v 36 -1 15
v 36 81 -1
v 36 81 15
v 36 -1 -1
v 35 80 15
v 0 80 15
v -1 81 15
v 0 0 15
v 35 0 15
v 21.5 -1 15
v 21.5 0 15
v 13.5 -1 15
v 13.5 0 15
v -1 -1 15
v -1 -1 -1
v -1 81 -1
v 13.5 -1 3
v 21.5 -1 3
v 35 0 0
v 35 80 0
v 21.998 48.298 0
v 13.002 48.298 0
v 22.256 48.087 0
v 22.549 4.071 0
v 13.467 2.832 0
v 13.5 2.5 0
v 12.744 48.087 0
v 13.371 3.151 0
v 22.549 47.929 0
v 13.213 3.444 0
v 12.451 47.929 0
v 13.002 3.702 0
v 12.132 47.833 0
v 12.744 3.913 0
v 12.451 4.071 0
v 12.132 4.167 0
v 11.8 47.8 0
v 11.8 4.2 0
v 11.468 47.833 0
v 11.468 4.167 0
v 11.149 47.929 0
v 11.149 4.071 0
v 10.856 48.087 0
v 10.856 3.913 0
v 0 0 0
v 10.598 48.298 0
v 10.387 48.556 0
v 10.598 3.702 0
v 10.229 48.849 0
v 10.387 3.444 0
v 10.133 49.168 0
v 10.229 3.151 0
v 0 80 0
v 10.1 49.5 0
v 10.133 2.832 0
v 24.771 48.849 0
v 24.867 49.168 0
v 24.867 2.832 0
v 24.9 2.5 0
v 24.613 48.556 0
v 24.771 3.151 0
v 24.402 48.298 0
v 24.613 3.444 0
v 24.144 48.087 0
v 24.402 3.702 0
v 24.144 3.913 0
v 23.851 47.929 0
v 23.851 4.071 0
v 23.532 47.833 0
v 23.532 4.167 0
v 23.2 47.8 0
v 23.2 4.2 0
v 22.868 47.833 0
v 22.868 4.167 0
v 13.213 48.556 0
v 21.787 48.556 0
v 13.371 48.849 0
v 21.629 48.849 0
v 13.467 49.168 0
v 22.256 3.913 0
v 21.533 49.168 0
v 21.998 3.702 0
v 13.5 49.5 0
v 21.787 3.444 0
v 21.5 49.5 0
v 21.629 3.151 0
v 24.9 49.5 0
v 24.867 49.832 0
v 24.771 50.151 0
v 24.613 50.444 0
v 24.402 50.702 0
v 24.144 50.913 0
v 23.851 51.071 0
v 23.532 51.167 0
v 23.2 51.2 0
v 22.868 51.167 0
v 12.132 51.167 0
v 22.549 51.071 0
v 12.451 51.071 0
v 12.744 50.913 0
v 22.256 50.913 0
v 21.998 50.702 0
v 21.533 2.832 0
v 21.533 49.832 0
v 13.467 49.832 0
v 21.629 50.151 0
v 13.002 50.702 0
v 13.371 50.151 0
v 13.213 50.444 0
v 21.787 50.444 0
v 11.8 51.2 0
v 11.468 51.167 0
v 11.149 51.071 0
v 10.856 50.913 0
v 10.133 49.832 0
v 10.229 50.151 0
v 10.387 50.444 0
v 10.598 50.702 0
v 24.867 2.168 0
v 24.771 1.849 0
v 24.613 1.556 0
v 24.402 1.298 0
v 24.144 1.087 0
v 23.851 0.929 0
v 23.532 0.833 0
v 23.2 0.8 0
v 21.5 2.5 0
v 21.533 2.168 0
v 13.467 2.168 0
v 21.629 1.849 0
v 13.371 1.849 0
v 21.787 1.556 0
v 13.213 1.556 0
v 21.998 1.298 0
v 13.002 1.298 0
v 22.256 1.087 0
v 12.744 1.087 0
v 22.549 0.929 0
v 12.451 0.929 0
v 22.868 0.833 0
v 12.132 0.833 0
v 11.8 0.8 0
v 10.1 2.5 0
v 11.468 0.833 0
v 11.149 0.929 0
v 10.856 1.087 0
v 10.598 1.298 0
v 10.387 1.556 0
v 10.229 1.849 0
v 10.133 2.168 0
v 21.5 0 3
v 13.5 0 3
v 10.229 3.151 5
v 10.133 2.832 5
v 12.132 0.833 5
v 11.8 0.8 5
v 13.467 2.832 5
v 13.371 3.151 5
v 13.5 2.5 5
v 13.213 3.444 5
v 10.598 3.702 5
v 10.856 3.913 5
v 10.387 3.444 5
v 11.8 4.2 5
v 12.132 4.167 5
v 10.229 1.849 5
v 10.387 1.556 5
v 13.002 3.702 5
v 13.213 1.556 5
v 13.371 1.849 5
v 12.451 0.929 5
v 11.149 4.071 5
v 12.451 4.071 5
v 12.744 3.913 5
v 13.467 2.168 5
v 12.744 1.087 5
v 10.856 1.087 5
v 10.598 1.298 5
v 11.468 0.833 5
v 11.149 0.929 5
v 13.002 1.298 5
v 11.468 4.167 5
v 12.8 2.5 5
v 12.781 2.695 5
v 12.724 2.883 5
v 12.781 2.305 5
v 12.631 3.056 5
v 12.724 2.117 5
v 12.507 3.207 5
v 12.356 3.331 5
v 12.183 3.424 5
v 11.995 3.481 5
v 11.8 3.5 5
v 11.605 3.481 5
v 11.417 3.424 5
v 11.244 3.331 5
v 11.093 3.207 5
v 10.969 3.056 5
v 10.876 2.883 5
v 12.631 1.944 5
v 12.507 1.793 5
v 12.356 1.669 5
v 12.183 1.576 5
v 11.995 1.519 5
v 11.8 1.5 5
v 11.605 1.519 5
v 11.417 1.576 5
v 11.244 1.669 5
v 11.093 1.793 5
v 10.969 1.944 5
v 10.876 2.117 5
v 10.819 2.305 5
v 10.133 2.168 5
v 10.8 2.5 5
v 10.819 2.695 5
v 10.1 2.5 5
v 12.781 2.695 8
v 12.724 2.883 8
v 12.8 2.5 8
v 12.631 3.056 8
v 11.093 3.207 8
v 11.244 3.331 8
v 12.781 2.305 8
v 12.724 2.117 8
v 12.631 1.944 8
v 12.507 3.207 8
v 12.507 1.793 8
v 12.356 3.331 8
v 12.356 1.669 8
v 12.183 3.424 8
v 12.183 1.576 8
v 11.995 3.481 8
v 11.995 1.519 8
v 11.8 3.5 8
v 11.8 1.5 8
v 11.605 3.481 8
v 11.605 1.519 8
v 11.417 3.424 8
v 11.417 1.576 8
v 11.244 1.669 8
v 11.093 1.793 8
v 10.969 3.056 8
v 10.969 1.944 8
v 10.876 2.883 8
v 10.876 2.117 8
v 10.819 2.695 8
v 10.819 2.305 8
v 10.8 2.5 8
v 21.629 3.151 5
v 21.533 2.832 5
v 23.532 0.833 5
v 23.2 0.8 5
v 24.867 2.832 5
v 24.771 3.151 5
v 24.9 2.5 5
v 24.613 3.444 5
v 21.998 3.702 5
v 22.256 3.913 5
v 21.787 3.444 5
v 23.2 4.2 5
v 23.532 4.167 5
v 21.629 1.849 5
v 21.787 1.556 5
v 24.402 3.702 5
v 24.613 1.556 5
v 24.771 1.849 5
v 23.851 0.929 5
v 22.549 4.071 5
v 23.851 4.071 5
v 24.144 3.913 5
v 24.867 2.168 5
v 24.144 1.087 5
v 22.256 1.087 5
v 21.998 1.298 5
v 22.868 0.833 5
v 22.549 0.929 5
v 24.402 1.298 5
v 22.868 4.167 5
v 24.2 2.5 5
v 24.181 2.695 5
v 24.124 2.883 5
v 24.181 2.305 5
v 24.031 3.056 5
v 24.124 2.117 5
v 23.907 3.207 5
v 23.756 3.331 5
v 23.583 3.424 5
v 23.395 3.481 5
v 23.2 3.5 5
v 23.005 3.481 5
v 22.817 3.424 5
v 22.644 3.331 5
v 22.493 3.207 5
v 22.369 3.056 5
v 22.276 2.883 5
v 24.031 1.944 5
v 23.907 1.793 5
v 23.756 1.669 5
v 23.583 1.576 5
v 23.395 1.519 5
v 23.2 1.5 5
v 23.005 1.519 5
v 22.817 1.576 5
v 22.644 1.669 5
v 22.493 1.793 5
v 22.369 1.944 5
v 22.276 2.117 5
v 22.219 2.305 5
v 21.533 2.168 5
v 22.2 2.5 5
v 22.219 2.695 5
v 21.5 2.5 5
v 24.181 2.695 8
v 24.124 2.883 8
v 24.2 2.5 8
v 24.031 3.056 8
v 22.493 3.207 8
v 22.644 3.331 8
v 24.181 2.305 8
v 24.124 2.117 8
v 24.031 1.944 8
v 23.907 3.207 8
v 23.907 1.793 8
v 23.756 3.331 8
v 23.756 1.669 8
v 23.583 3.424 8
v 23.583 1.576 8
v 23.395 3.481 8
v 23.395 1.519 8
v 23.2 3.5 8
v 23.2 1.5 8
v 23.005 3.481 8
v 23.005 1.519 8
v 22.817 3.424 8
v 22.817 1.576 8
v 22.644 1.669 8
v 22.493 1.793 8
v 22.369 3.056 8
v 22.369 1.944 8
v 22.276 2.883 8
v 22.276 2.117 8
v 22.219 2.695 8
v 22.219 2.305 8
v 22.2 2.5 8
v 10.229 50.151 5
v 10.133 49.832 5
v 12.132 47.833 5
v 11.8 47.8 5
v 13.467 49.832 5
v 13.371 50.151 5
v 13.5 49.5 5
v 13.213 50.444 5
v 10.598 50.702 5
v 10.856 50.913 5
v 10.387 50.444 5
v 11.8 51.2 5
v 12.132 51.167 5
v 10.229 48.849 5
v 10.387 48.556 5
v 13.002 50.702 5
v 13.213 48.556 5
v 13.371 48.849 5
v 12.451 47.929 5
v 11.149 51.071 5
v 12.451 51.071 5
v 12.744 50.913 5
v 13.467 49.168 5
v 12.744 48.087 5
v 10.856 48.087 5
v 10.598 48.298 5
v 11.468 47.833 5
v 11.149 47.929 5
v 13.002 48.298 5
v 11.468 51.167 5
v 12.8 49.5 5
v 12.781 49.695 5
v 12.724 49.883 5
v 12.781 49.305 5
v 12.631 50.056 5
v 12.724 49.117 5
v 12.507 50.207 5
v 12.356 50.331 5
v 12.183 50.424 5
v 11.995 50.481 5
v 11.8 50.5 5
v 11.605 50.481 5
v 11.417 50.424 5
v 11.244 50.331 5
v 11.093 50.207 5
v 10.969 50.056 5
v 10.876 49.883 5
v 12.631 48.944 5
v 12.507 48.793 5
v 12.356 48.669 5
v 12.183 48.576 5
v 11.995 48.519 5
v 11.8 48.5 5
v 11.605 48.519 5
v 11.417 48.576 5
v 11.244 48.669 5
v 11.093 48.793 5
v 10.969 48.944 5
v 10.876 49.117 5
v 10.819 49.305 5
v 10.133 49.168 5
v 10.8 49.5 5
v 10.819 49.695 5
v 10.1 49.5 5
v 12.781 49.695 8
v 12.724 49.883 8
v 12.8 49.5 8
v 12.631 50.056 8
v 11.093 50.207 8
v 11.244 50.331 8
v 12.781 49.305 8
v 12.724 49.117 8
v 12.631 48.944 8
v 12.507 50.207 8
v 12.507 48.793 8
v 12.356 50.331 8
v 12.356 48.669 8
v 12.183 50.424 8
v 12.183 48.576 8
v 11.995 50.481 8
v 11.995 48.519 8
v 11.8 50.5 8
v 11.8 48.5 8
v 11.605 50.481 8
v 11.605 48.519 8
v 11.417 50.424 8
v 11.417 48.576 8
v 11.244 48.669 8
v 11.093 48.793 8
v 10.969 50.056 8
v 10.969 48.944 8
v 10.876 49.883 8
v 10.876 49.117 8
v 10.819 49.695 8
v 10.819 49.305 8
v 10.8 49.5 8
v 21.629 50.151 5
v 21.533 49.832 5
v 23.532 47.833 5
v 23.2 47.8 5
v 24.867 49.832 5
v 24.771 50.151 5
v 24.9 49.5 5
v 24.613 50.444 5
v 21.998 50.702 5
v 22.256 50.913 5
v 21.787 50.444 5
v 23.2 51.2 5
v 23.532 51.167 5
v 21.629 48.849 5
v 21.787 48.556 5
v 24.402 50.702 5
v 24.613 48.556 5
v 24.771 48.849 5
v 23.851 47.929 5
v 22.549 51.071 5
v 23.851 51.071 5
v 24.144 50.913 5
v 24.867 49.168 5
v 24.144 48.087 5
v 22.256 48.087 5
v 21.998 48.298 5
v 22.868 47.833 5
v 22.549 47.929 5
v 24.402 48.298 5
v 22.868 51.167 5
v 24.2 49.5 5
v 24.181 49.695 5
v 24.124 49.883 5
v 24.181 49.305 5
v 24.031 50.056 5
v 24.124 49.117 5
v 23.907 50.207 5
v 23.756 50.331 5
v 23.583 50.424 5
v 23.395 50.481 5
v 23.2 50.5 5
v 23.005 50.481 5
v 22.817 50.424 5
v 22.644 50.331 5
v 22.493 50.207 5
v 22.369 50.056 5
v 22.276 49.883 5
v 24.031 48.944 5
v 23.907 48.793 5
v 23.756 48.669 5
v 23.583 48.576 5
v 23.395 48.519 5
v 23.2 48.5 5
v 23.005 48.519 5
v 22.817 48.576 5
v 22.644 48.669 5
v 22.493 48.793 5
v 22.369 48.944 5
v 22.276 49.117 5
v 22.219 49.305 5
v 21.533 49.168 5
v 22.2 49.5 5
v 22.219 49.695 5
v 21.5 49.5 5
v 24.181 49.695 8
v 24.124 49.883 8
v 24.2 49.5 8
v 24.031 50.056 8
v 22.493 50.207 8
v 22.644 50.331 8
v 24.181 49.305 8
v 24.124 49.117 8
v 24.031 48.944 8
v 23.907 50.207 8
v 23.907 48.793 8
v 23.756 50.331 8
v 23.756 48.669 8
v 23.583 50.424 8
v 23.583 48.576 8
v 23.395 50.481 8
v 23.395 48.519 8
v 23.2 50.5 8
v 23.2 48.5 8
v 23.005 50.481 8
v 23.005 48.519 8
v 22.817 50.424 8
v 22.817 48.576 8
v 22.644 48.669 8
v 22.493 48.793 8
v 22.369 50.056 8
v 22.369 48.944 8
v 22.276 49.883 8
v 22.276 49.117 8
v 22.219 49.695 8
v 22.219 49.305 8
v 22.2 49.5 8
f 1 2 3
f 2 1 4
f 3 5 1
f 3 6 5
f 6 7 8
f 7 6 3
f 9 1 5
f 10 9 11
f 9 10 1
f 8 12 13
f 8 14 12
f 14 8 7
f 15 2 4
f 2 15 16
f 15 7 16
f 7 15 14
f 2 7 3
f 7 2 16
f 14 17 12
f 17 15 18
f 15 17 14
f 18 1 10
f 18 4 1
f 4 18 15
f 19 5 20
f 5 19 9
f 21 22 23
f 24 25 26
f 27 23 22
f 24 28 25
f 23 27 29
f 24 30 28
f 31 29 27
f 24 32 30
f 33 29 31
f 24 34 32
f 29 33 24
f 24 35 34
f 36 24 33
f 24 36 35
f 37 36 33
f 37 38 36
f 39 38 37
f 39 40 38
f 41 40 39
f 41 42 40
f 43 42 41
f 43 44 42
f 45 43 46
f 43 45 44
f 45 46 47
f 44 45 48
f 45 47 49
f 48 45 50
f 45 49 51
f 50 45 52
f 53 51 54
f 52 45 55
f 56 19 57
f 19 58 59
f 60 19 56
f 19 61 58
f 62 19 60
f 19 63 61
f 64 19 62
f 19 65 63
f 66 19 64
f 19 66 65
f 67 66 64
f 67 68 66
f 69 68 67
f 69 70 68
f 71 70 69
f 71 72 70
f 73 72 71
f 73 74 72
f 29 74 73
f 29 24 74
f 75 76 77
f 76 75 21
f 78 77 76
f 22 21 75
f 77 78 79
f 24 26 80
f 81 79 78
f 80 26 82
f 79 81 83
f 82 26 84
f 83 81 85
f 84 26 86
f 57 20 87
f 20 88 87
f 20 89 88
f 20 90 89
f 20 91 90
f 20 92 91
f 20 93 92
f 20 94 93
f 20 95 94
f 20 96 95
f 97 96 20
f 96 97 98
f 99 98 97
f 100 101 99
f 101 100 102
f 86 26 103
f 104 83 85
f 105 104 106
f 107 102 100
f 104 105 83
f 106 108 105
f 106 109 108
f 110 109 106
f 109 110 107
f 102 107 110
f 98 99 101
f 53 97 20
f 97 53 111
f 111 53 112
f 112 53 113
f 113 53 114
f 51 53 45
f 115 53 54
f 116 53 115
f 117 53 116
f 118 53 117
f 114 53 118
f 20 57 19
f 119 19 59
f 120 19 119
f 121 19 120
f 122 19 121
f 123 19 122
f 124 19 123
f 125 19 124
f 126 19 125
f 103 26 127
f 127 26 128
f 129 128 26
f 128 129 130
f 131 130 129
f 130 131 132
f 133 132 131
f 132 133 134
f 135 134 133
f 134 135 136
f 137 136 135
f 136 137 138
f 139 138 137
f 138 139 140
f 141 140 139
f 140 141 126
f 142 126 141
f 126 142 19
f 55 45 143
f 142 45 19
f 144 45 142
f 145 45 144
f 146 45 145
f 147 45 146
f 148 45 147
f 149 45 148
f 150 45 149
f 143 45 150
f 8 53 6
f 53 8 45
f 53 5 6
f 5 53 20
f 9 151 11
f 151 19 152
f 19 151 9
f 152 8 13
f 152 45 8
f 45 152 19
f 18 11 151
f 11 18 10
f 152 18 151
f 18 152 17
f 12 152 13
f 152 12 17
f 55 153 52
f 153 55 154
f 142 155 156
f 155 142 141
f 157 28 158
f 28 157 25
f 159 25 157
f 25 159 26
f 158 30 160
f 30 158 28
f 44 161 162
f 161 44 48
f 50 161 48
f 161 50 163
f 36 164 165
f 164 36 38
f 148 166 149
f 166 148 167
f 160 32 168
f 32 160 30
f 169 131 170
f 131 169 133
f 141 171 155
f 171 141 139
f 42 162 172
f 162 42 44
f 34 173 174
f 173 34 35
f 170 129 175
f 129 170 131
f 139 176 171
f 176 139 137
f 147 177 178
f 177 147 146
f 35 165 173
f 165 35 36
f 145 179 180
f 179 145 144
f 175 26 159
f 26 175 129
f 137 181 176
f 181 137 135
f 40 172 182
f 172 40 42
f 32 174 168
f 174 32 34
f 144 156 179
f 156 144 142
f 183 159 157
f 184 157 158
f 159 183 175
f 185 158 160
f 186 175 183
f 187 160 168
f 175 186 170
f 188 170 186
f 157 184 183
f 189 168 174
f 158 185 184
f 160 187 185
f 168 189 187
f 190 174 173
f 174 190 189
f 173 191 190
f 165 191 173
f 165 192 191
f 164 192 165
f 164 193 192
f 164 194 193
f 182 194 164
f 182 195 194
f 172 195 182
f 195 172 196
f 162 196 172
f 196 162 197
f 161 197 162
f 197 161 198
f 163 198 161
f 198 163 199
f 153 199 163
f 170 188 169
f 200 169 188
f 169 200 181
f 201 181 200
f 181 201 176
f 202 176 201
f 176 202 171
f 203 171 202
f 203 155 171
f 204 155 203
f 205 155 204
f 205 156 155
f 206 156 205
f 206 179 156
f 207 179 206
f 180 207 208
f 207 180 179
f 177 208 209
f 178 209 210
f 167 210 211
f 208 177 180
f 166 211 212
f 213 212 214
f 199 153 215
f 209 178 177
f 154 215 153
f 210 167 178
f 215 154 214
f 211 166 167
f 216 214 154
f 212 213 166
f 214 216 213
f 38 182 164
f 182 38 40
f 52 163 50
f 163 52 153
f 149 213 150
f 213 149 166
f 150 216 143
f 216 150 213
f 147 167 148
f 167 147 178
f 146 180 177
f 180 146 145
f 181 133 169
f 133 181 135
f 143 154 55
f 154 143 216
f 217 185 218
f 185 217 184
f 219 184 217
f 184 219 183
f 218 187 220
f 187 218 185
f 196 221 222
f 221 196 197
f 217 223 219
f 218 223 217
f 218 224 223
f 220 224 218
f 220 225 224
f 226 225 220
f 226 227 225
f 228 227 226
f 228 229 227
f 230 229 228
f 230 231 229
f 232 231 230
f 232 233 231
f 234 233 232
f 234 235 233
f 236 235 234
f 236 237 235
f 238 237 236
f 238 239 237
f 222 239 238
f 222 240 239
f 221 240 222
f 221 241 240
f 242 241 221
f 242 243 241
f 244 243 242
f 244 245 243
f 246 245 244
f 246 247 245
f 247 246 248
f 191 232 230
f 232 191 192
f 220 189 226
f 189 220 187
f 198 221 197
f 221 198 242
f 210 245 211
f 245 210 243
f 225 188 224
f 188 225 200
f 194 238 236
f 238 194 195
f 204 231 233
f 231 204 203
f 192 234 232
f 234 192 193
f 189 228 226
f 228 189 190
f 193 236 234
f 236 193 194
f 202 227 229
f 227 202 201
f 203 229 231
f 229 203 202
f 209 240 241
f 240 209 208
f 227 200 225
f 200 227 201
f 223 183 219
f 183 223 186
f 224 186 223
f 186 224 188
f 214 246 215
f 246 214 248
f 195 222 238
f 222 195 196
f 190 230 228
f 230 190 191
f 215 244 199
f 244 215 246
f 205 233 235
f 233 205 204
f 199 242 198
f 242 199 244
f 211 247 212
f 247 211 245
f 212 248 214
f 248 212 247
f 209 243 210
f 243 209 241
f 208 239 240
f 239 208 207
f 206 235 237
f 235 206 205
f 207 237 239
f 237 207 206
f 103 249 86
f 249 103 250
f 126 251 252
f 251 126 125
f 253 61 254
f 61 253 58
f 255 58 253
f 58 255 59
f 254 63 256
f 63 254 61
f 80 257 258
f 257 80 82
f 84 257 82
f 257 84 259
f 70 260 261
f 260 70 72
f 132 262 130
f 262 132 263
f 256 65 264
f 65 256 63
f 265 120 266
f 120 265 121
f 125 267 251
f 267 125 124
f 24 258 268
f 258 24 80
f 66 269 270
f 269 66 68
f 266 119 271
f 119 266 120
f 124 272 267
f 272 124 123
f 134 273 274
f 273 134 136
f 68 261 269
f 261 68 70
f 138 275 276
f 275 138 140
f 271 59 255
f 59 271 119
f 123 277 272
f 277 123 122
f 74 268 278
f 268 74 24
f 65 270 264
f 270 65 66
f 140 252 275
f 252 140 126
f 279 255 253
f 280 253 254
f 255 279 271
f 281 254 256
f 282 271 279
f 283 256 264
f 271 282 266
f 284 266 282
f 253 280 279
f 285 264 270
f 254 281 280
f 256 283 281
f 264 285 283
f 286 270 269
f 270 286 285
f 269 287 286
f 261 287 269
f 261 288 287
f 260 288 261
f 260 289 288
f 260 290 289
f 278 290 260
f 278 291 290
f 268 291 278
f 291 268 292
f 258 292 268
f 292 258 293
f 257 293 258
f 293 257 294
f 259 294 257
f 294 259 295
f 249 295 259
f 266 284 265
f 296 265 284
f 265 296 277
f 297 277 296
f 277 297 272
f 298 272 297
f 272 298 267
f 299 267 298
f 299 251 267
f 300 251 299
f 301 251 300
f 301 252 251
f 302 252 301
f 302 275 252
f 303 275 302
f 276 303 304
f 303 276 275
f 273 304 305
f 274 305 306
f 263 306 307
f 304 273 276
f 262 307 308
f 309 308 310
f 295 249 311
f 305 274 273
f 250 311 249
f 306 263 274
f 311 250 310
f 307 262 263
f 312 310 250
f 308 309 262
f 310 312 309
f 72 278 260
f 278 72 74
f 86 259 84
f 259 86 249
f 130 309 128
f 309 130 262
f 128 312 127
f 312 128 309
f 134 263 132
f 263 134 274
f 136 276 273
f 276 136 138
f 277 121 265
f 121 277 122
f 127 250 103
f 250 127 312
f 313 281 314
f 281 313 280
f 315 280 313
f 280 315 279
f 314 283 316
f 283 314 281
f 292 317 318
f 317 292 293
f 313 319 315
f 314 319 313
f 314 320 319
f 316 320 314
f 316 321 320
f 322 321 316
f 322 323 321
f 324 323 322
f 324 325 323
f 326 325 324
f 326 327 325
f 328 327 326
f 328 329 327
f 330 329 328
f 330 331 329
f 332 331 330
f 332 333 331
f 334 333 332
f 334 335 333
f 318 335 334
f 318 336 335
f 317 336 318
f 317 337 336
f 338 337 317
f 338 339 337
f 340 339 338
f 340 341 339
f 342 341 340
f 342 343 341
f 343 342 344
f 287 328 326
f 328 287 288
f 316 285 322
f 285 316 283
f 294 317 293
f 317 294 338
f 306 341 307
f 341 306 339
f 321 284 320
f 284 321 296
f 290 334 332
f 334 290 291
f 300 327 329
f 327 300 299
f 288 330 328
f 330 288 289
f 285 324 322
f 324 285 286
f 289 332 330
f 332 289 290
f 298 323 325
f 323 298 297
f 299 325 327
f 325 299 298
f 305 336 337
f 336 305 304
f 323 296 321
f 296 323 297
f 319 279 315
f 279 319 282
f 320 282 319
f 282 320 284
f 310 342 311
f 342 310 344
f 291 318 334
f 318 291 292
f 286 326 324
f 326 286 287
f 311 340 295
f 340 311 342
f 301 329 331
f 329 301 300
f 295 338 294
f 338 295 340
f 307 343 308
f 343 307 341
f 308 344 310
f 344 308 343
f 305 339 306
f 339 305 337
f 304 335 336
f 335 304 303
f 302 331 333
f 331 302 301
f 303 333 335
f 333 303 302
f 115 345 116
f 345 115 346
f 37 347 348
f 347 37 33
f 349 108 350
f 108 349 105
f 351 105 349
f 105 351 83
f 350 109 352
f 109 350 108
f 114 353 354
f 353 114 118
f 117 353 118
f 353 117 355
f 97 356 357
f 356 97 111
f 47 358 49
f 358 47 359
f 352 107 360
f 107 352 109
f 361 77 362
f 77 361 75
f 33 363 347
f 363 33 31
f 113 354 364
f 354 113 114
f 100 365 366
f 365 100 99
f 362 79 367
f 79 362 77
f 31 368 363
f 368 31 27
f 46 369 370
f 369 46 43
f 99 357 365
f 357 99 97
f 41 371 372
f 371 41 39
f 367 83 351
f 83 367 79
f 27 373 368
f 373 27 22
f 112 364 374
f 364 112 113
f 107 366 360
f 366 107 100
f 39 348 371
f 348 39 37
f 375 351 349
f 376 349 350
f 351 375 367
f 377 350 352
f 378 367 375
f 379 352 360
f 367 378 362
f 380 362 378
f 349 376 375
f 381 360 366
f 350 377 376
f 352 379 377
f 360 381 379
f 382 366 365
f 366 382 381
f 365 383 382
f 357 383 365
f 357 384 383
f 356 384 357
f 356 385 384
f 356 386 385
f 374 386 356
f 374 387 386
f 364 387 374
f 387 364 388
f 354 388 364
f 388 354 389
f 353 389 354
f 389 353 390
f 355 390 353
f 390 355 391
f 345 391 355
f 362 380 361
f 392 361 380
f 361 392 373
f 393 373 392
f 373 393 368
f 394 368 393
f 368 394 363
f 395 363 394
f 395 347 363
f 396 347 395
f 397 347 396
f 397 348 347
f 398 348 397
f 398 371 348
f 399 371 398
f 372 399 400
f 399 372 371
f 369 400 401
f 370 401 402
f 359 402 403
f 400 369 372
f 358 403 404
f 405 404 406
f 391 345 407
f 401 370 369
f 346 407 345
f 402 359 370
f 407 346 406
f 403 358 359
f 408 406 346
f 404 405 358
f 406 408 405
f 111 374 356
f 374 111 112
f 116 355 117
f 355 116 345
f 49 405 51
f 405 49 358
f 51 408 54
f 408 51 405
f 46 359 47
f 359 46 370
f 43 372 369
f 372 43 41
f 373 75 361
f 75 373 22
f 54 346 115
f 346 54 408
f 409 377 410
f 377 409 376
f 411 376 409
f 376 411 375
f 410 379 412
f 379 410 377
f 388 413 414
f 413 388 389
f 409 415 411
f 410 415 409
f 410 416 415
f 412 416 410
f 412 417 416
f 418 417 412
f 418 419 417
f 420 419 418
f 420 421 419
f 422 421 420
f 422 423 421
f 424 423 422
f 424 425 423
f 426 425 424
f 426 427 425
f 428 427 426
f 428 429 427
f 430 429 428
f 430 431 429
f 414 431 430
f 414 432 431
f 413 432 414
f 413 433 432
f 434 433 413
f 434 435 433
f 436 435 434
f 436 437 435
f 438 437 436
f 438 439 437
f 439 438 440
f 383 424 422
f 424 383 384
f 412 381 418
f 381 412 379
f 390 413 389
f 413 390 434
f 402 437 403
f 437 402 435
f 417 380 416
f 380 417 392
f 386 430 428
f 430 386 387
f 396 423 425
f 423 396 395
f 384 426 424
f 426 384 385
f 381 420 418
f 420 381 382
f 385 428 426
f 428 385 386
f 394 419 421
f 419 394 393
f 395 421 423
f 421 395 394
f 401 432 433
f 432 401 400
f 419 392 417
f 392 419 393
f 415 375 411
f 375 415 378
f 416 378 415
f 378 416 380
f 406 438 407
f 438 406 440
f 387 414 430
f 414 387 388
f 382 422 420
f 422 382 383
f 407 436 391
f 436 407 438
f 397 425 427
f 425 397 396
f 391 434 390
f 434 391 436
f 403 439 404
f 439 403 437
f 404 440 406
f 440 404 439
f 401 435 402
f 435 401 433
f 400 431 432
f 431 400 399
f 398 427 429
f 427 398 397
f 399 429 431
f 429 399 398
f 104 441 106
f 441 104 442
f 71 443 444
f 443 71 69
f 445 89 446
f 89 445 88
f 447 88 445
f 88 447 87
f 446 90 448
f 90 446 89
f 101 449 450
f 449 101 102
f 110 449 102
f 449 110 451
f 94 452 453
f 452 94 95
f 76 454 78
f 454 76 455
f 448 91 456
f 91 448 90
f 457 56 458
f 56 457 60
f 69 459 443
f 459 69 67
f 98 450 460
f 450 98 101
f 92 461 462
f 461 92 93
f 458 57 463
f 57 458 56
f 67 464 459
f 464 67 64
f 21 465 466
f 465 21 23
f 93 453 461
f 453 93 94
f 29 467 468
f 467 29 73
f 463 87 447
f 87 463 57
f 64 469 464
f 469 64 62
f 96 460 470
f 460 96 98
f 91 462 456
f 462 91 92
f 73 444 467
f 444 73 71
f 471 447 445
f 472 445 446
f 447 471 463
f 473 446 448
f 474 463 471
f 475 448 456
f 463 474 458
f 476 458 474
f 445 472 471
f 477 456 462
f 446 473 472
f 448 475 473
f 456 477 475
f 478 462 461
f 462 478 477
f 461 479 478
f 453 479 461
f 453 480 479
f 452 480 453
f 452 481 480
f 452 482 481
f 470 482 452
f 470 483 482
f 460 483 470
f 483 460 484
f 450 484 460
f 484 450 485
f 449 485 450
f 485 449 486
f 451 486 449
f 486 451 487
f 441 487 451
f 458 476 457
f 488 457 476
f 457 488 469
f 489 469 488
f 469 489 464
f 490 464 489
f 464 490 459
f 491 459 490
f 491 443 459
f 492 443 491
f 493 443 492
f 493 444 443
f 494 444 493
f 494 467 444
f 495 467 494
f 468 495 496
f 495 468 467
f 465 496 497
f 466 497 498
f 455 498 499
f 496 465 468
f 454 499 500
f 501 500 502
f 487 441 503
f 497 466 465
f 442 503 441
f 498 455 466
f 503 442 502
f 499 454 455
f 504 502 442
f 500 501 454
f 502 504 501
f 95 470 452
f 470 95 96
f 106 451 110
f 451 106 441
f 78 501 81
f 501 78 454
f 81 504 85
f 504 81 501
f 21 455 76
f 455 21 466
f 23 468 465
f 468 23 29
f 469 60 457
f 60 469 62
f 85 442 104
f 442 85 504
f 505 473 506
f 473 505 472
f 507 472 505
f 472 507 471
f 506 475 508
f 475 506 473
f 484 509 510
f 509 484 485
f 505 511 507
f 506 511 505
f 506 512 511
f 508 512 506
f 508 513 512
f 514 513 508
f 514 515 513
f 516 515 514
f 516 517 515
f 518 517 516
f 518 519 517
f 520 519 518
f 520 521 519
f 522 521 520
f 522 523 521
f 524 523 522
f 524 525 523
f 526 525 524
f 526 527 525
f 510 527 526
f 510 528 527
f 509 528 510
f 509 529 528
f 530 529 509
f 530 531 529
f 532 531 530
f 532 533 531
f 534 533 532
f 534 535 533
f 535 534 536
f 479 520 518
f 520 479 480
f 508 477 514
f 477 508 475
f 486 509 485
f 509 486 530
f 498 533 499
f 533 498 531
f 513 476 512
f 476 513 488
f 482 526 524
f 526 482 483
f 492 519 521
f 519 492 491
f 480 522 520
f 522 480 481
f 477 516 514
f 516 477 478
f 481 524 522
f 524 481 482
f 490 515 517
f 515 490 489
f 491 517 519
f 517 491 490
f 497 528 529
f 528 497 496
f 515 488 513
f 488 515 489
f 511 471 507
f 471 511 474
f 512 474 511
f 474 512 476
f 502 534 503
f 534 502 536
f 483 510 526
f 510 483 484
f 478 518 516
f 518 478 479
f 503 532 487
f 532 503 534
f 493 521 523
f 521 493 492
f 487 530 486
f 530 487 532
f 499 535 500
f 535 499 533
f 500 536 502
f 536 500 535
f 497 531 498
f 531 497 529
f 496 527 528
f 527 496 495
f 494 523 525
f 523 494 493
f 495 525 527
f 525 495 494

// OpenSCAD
// file: pico.scad
use <generic.scad>;

module picoStuds(x,y,z)
{
    translate([x,y,z])
    union() {
        stud(4.8, 2, 0, 1, 5);
        stud(16.2, 2, 0, 1, 5);
        stud(4.8, 49, 0, 1, 5);
        stud(16.2, 49, 0, 1, 5);
    }
}

module picoStudHoles(x,y,z, h)
{
    translate([x+1,y+1,z])
    union() {
        studHole(4.8, 2, 0, 2, h);
        studHole(16.2, 2, 0, 2, h);
        studHole(4.8, 49, 0, 2, h);
        studHole(16.2, 49, 0, 2, h);
    }
}
// file: generic.scad
module myBox(x,y,z,w,d,h) 
{
    translate([x-1,y-1,z-1])
    difference() {
        cube([w+2, d+2, h+1]);
        translate([1, 1, 1])
            cube([w, d, h]);
    }
}

module stud(x,y,z, radius, h)
{
    translate([x,y,z])
    union() {
        cylinder(h, radius + 0.7, radius+0.7);
        translate([0,0, h])
        cylinder(3, radius, radius);        
    }
}

module studHole(x,y,z, radius, h)
{
    translate([x,y,z])
    difference() {
        cylinder(h, radius + 1, radius+1);
        translate([0,0,h-2])
        cylinder(2, radius, radius);
    }    
}
// main file
$fn=32;

use <generic.scad>;
use <pico.scad>;

difference() {
    myBox(0,0,0,35,80,15);
    translate([17.5, 0, 15])
        cube([8,6,24], center=true);
    translate([17.5, 5, 9])    
        rotate([90,0,0])
            cylinder(10, 3, 3);
}
picoStuds(7,0.5,0);
